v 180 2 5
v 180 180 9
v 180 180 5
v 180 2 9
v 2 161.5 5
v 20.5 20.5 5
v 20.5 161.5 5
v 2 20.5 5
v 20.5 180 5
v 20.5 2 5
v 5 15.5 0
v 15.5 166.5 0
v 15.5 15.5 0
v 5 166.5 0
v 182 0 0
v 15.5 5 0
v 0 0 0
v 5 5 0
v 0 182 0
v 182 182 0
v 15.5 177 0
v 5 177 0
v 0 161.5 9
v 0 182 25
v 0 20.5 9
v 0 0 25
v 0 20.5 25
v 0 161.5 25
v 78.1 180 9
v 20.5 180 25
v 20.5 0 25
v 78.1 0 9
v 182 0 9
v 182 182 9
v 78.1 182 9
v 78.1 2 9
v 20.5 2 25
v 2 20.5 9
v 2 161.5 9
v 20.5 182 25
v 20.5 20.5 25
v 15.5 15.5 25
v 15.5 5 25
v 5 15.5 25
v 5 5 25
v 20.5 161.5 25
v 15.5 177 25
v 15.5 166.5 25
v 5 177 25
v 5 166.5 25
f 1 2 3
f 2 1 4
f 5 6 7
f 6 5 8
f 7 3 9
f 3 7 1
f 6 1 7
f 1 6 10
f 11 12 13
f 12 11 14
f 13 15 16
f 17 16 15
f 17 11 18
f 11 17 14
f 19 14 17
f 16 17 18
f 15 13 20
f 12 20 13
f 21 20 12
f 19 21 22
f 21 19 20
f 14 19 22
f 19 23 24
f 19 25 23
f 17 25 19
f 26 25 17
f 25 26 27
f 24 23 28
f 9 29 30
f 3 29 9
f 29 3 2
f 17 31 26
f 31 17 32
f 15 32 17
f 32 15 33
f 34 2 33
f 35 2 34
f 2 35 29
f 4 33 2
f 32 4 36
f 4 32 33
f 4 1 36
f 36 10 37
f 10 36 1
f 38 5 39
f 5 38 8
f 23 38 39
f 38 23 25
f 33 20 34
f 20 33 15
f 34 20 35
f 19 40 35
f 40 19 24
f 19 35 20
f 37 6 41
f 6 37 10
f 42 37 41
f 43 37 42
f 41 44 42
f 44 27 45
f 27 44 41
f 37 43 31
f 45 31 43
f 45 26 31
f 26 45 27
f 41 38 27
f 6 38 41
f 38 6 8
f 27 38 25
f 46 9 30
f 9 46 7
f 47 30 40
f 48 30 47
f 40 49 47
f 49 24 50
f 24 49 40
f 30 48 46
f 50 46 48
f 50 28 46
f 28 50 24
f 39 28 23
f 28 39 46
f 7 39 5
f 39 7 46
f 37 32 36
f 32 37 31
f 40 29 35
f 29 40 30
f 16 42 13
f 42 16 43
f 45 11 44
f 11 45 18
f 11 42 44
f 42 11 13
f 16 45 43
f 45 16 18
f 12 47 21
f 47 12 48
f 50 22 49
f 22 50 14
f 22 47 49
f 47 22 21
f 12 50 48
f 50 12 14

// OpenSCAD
leghole = 10.5;
legheight = 25;
legwallthickness = 10;
legsupport = leghole+legwallthickness;

traysize = 180;
trayz = 5;
rimwidth = 2;
rimheight = 4;


//difference() {
//    cube([legsupport,legsupport,legheight], center = false);    
//    translate([legsupport/2,legsupport/2,legheight/2]) 
//        cube([leghole,leghole,legheight+1], center = true);
//}

difference(){
    union() {
        // tray
        cube([traysize,traysize,trayz], center=false);
        cube([traysize,rimwidth,trayz+rimheight], center = false);
        cube([rimwidth,traysize,trayz+rimheight], center = false);
        translate([0,traysize,0])
            cube([traysize+rimwidth,rimwidth,trayz+rimheight], center = false);
        translate([traysize,0,0])
            cube([rimwidth,traysize+rimwidth,trayz+rimheight], center = false);
        
        //leg supports
        cube([legsupport,legsupport,legheight], center = false);
        translate([0,traysize-legsupport+rimwidth,0]) cube([legsupport,legsupport,legheight], center = false);
        
        translate([legsupport,0,0])
        polyhedron([ 
            [0,0,0], 
            [traysize/2,0,0],  
            [0,0,legheight],
            [0,rimwidth,0], 
            [traysize/2,rimwidth,0], 
            [0,rimwidth,legheight]
        ], 
        [ [0,1,2], [5,4,3], [2,1,4,5], [0,3,4,1], [0,2,5,3] ]);
            
        translate([legsupport,traysize,0])
        polyhedron([ 
            [0,0,0], 
            [traysize/2,0,0],  
            [0,0,legheight],
            [0,rimwidth,0], 
            [traysize/2,rimwidth,0], 
            [0,rimwidth,legheight]
        ], 
        [ [0,1,2], [5,4,3], [2,1,4,5], [0,3,4,1], [0,2,5,3] ]);    
        
    }

    translate([legsupport/2,legsupport/2,legheight/2]) 
      cube([leghole,leghole,legheight+1], center = true);
    translate([legsupport/2,legsupport/2 + traysize - legsupport + rimwidth,legheight/2]) 
      cube([leghole,leghole,legheight+1], center = true);
  

}
